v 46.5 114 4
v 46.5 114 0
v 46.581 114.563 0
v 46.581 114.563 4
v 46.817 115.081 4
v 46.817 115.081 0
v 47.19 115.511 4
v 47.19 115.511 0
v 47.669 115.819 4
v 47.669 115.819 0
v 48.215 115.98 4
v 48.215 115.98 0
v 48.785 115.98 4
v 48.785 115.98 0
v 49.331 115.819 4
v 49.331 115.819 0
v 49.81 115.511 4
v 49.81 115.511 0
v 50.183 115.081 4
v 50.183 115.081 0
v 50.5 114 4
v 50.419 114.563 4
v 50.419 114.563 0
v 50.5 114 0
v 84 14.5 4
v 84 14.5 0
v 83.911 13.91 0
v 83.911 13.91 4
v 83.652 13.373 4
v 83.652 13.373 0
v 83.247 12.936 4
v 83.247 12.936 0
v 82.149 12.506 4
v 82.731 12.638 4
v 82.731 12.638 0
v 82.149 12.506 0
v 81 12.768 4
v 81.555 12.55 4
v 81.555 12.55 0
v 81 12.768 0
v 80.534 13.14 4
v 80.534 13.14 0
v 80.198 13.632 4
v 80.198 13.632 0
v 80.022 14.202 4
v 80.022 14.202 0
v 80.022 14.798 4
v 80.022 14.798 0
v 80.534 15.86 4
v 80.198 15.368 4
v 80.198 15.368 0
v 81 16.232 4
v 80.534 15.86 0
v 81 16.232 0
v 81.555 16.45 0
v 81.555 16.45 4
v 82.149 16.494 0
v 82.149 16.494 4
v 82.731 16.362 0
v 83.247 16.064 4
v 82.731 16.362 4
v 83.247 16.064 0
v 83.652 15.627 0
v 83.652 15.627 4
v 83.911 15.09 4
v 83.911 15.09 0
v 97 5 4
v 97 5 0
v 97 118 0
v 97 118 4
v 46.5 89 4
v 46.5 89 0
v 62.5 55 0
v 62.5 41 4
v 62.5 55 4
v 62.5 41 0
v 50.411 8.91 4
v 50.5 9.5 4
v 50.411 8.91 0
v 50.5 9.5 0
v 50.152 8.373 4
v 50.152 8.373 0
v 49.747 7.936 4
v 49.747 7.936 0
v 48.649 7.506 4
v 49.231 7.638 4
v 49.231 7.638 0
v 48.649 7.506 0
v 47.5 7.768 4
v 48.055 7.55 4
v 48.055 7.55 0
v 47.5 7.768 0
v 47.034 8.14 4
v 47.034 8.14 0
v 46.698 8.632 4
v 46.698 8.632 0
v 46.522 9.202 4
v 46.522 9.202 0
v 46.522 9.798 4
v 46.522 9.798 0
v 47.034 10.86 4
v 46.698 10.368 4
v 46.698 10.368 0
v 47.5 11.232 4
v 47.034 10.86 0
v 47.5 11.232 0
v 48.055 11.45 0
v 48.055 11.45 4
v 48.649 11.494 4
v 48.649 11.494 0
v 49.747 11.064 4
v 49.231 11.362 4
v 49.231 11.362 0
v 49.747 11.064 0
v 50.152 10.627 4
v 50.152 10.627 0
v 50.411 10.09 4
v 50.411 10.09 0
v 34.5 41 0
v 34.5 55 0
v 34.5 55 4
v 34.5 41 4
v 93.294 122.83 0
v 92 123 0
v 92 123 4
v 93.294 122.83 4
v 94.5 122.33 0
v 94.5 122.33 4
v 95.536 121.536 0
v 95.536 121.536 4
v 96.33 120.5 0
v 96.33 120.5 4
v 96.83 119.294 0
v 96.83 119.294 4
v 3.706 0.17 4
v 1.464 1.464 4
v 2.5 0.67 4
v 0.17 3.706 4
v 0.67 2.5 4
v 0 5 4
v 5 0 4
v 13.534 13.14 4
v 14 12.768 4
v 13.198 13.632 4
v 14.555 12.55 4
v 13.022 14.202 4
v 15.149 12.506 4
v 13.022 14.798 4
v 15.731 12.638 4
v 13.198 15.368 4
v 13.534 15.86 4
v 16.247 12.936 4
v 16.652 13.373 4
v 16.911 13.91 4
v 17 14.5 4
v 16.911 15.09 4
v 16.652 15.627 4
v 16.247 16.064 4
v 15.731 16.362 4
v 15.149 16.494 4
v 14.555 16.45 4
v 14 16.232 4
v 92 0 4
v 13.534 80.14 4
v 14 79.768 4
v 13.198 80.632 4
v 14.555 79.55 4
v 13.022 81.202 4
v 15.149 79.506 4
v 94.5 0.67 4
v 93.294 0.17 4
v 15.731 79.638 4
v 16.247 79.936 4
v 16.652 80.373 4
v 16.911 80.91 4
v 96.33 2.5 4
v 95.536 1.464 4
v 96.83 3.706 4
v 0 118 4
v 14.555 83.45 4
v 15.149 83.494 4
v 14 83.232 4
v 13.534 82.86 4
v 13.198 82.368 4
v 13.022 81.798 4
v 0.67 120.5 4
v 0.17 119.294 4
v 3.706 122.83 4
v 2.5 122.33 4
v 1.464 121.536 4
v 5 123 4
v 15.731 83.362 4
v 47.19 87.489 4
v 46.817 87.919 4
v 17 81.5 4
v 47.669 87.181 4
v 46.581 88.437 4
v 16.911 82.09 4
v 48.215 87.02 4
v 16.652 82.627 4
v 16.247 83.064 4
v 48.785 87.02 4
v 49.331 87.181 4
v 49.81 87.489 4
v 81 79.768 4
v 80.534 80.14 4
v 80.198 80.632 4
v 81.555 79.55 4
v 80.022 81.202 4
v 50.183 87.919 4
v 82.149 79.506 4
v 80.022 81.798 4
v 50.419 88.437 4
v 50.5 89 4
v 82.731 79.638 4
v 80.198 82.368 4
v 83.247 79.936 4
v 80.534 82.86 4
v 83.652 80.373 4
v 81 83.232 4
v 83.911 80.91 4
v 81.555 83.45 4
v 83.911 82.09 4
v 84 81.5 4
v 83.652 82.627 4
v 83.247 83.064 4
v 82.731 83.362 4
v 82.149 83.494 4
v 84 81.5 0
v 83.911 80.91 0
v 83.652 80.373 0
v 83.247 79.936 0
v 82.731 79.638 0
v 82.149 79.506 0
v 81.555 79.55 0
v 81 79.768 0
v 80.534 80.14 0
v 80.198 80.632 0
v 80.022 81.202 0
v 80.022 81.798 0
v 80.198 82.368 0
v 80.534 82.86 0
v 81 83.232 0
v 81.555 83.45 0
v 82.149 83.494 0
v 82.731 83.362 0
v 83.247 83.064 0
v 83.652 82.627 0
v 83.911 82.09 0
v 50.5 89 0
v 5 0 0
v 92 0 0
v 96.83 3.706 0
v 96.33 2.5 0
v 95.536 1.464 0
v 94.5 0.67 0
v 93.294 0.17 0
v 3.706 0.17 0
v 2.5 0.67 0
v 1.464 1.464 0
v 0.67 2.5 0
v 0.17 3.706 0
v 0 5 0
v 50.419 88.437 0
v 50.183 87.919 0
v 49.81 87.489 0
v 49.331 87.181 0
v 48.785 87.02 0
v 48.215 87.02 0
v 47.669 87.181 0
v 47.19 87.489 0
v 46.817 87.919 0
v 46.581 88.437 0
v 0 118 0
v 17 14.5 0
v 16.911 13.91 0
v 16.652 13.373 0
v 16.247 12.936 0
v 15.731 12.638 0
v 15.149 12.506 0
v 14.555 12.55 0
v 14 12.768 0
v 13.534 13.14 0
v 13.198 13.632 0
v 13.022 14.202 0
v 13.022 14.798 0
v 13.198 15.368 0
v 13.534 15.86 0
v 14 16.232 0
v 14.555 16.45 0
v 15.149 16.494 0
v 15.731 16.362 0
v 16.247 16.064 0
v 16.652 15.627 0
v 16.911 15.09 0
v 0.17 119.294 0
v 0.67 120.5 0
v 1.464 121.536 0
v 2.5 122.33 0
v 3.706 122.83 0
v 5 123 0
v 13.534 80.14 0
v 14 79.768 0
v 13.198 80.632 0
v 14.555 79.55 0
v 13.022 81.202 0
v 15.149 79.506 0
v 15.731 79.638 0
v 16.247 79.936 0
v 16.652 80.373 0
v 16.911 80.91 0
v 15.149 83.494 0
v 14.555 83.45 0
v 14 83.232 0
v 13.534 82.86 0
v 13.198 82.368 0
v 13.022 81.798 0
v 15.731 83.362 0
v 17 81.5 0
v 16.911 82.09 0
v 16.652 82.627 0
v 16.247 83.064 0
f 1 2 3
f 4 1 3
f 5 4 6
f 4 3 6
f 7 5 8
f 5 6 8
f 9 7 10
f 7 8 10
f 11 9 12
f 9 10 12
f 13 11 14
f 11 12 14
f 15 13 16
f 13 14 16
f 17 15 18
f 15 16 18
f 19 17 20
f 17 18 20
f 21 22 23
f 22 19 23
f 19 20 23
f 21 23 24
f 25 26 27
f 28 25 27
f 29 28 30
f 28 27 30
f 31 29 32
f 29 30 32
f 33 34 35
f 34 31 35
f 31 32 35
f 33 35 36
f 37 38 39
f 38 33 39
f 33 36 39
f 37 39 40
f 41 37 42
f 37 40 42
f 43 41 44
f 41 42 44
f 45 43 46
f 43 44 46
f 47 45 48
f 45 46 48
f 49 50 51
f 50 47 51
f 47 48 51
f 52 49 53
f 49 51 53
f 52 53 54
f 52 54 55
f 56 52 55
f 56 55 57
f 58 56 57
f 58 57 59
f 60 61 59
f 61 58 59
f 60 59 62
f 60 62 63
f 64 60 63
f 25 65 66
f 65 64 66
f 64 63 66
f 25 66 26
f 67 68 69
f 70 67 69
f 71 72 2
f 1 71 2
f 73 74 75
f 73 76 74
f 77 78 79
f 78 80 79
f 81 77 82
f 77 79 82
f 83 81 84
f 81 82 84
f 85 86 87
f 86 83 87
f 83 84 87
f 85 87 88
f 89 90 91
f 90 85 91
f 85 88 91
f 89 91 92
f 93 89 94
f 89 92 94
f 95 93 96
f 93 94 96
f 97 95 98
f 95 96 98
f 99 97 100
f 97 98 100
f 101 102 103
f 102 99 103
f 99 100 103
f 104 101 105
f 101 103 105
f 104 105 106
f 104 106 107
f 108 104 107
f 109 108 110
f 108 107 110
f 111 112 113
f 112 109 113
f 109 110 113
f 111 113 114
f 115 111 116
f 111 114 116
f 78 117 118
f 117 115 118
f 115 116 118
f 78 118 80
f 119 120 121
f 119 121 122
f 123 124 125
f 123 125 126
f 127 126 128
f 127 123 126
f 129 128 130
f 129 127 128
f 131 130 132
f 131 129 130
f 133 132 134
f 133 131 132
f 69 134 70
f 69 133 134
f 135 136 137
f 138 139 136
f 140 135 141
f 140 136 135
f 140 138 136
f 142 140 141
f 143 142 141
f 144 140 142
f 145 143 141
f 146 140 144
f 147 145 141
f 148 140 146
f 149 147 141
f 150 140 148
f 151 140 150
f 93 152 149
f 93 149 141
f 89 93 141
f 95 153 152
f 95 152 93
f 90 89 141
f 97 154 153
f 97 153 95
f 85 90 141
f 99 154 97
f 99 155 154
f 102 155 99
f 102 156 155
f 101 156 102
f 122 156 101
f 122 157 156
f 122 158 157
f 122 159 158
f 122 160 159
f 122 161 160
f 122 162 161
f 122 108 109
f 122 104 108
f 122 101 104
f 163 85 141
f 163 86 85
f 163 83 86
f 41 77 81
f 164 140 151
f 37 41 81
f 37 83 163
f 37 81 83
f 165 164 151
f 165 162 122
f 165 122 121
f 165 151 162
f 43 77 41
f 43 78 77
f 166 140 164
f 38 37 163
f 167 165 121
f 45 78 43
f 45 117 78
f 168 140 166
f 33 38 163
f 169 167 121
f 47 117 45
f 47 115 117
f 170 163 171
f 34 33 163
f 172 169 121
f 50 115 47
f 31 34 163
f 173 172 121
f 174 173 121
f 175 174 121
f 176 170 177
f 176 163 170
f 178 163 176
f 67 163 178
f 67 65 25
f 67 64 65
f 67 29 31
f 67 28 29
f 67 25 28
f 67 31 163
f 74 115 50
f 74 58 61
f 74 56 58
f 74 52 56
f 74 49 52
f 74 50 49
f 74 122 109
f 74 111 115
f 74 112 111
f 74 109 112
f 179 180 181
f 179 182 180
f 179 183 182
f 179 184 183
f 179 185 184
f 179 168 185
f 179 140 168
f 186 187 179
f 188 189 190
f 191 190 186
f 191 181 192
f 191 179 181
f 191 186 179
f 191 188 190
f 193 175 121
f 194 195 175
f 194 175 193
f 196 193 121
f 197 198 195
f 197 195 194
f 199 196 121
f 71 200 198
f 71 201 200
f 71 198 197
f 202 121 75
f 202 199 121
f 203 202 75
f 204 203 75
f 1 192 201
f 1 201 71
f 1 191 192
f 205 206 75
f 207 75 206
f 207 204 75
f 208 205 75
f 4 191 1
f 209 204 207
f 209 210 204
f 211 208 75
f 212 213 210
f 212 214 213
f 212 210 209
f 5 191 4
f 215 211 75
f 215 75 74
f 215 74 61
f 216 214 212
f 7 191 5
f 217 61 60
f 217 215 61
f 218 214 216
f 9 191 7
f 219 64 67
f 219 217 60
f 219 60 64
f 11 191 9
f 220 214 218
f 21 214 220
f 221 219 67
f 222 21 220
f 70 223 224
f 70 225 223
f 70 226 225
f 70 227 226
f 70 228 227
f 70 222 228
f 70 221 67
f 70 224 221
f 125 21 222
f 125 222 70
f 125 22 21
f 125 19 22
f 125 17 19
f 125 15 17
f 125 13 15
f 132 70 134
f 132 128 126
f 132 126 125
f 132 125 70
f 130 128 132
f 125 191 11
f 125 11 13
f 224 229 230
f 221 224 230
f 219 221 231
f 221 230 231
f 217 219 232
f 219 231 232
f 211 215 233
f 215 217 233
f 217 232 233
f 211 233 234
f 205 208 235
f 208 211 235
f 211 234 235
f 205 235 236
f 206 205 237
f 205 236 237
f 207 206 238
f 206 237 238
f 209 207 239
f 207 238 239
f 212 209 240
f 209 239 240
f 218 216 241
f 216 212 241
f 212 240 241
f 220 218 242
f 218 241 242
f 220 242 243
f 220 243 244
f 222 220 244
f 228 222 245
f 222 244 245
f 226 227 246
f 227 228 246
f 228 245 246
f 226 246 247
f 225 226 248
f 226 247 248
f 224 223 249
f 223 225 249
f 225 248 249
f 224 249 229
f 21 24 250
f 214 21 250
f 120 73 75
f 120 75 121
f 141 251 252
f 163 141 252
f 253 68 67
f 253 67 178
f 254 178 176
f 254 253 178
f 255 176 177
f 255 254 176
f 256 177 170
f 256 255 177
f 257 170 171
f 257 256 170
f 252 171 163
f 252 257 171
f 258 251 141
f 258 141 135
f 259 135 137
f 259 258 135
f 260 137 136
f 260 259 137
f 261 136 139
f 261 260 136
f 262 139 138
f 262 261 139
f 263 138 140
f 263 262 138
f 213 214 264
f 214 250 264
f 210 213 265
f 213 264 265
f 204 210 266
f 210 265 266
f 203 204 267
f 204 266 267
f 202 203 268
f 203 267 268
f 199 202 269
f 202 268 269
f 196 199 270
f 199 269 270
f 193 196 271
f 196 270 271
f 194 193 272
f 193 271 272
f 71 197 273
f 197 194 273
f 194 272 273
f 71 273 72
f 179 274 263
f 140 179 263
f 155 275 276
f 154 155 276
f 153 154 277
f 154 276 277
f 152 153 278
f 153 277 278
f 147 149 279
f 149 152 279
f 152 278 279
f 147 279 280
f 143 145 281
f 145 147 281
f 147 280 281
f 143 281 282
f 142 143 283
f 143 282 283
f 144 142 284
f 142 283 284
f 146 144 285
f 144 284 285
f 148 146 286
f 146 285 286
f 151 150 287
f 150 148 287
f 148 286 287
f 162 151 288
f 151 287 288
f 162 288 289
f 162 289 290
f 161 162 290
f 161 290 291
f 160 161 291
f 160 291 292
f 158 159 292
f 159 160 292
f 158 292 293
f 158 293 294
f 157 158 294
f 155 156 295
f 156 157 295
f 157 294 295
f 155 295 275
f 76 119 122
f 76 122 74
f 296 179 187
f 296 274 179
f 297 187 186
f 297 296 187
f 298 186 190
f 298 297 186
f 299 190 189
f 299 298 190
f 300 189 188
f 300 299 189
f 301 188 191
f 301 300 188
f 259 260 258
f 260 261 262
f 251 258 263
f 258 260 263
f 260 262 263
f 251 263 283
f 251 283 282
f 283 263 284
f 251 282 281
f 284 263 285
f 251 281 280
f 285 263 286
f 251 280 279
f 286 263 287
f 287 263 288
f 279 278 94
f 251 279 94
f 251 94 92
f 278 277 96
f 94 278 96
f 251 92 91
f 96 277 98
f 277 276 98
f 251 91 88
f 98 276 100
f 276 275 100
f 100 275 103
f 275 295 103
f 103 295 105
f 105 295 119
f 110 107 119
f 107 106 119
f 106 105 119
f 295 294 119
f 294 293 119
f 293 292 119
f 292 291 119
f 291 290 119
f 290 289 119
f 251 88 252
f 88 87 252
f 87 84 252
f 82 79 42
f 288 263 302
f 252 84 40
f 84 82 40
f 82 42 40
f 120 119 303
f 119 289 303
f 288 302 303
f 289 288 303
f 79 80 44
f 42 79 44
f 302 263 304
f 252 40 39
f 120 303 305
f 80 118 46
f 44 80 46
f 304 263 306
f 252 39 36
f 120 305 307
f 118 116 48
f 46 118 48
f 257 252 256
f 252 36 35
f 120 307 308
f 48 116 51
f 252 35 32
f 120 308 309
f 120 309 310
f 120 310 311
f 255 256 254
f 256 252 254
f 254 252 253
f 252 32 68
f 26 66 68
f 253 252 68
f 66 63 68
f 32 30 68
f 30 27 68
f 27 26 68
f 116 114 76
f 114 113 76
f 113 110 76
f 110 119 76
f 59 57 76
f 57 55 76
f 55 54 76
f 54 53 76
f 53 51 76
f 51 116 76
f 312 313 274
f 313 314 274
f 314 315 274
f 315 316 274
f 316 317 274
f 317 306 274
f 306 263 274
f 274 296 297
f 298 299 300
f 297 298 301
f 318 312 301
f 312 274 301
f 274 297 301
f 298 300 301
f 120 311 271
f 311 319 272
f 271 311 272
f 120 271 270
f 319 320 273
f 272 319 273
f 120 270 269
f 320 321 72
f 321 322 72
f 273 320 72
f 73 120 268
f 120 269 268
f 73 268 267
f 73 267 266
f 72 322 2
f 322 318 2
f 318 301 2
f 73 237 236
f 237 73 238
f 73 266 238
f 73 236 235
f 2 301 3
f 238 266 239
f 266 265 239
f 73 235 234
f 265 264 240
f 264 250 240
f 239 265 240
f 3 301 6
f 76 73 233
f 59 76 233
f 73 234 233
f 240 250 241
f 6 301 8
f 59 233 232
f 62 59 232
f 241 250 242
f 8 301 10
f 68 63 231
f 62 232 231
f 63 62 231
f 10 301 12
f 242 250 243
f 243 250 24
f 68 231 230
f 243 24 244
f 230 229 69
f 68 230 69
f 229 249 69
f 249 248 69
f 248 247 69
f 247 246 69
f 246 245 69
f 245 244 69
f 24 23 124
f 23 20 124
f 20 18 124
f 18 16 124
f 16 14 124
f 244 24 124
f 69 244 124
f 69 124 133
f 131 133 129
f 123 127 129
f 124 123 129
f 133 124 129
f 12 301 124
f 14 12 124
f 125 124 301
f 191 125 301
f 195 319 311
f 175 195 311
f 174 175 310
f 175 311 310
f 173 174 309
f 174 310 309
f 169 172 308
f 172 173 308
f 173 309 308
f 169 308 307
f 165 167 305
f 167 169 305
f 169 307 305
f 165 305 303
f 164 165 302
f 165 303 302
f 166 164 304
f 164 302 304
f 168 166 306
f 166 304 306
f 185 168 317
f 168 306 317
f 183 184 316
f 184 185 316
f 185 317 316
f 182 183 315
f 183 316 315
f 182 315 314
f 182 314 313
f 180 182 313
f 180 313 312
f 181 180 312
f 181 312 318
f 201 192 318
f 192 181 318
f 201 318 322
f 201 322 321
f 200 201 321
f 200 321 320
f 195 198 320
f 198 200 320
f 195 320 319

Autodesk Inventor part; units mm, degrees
ref_plane "YZ Plane" through (0, 0, 0) normal (1, 0, 0) x (0, 1, 0)
ref_plane "XZ Plane" through (0, 0, 0) normal (0, 1, 0) x (-1, 0, 0)
ref_plane "XY Plane" through (0, 0, 0) normal (0, 0, 1) x (1, 0, 0)
sketch "Эскиз1" plane through (0, 0, 0) normal (0, 0, 1) x (1, 0, 0)
  line L0 (5, 0) -> (92, 0)
  line L1 (97, 5) -> (97, 118)
  line L2 (92, 123) -> (5, 123)
  line L3 (0, 118) -> (0, 5)
  arc A0 (5, 123) -> (0, 118) centre (5, 118) ccw
  arc A1 (97, 118) -> (92, 123) centre (92, 118) ccw
  arc A2 (92, 0) -> (97, 5) centre (92, 5) ccw
  arc A3 (0, 5) -> (5, 0) centre (5, 5) ccw
  arc A4 (46.5, 89) -> (50.5, 89) centre (48.5, 89) ccw
  arc A5 (50.5, 114) -> (46.5, 114) centre (48.5, 114) ccw
  line L4 (46.5, 89) -> (46.5, 114)
  line L5 (50.5, 114) -> (50.5, 89)
  circle A6 centre (48.5, 9.5) radius 2
  line L6 (34.5, 41) -> (62.5, 41)
  line L7 (62.5, 41) -> (62.5, 55)
  line L8 (62.5, 55) -> (34.5, 55)
  line L9 (34.5, 55) -> (34.5, 41)
  circle A7 centre (15, 14.5) radius 2
  circle A8 centre (15, 81.5) radius 2
  circle A9 centre (82, 81.5) radius 2
  circle A10 centre (82, 14.5) radius 2
  point P0 (0, 0)
  point P1 (97, 123)
  point P2 (0, 123)
  dimension "d10" = 5
  dimension "d21" = 4
  dimension "d22" = 4
  dimension "d23" = 4
  dimension "d29" = 28
  dimension "d30" = 14
extrude "Выдавливание2" add sketch "Эскиз1" along normal blind 4
properties part number "Адаптер для считывателя Bolid Proxy-2MA часть 2"
